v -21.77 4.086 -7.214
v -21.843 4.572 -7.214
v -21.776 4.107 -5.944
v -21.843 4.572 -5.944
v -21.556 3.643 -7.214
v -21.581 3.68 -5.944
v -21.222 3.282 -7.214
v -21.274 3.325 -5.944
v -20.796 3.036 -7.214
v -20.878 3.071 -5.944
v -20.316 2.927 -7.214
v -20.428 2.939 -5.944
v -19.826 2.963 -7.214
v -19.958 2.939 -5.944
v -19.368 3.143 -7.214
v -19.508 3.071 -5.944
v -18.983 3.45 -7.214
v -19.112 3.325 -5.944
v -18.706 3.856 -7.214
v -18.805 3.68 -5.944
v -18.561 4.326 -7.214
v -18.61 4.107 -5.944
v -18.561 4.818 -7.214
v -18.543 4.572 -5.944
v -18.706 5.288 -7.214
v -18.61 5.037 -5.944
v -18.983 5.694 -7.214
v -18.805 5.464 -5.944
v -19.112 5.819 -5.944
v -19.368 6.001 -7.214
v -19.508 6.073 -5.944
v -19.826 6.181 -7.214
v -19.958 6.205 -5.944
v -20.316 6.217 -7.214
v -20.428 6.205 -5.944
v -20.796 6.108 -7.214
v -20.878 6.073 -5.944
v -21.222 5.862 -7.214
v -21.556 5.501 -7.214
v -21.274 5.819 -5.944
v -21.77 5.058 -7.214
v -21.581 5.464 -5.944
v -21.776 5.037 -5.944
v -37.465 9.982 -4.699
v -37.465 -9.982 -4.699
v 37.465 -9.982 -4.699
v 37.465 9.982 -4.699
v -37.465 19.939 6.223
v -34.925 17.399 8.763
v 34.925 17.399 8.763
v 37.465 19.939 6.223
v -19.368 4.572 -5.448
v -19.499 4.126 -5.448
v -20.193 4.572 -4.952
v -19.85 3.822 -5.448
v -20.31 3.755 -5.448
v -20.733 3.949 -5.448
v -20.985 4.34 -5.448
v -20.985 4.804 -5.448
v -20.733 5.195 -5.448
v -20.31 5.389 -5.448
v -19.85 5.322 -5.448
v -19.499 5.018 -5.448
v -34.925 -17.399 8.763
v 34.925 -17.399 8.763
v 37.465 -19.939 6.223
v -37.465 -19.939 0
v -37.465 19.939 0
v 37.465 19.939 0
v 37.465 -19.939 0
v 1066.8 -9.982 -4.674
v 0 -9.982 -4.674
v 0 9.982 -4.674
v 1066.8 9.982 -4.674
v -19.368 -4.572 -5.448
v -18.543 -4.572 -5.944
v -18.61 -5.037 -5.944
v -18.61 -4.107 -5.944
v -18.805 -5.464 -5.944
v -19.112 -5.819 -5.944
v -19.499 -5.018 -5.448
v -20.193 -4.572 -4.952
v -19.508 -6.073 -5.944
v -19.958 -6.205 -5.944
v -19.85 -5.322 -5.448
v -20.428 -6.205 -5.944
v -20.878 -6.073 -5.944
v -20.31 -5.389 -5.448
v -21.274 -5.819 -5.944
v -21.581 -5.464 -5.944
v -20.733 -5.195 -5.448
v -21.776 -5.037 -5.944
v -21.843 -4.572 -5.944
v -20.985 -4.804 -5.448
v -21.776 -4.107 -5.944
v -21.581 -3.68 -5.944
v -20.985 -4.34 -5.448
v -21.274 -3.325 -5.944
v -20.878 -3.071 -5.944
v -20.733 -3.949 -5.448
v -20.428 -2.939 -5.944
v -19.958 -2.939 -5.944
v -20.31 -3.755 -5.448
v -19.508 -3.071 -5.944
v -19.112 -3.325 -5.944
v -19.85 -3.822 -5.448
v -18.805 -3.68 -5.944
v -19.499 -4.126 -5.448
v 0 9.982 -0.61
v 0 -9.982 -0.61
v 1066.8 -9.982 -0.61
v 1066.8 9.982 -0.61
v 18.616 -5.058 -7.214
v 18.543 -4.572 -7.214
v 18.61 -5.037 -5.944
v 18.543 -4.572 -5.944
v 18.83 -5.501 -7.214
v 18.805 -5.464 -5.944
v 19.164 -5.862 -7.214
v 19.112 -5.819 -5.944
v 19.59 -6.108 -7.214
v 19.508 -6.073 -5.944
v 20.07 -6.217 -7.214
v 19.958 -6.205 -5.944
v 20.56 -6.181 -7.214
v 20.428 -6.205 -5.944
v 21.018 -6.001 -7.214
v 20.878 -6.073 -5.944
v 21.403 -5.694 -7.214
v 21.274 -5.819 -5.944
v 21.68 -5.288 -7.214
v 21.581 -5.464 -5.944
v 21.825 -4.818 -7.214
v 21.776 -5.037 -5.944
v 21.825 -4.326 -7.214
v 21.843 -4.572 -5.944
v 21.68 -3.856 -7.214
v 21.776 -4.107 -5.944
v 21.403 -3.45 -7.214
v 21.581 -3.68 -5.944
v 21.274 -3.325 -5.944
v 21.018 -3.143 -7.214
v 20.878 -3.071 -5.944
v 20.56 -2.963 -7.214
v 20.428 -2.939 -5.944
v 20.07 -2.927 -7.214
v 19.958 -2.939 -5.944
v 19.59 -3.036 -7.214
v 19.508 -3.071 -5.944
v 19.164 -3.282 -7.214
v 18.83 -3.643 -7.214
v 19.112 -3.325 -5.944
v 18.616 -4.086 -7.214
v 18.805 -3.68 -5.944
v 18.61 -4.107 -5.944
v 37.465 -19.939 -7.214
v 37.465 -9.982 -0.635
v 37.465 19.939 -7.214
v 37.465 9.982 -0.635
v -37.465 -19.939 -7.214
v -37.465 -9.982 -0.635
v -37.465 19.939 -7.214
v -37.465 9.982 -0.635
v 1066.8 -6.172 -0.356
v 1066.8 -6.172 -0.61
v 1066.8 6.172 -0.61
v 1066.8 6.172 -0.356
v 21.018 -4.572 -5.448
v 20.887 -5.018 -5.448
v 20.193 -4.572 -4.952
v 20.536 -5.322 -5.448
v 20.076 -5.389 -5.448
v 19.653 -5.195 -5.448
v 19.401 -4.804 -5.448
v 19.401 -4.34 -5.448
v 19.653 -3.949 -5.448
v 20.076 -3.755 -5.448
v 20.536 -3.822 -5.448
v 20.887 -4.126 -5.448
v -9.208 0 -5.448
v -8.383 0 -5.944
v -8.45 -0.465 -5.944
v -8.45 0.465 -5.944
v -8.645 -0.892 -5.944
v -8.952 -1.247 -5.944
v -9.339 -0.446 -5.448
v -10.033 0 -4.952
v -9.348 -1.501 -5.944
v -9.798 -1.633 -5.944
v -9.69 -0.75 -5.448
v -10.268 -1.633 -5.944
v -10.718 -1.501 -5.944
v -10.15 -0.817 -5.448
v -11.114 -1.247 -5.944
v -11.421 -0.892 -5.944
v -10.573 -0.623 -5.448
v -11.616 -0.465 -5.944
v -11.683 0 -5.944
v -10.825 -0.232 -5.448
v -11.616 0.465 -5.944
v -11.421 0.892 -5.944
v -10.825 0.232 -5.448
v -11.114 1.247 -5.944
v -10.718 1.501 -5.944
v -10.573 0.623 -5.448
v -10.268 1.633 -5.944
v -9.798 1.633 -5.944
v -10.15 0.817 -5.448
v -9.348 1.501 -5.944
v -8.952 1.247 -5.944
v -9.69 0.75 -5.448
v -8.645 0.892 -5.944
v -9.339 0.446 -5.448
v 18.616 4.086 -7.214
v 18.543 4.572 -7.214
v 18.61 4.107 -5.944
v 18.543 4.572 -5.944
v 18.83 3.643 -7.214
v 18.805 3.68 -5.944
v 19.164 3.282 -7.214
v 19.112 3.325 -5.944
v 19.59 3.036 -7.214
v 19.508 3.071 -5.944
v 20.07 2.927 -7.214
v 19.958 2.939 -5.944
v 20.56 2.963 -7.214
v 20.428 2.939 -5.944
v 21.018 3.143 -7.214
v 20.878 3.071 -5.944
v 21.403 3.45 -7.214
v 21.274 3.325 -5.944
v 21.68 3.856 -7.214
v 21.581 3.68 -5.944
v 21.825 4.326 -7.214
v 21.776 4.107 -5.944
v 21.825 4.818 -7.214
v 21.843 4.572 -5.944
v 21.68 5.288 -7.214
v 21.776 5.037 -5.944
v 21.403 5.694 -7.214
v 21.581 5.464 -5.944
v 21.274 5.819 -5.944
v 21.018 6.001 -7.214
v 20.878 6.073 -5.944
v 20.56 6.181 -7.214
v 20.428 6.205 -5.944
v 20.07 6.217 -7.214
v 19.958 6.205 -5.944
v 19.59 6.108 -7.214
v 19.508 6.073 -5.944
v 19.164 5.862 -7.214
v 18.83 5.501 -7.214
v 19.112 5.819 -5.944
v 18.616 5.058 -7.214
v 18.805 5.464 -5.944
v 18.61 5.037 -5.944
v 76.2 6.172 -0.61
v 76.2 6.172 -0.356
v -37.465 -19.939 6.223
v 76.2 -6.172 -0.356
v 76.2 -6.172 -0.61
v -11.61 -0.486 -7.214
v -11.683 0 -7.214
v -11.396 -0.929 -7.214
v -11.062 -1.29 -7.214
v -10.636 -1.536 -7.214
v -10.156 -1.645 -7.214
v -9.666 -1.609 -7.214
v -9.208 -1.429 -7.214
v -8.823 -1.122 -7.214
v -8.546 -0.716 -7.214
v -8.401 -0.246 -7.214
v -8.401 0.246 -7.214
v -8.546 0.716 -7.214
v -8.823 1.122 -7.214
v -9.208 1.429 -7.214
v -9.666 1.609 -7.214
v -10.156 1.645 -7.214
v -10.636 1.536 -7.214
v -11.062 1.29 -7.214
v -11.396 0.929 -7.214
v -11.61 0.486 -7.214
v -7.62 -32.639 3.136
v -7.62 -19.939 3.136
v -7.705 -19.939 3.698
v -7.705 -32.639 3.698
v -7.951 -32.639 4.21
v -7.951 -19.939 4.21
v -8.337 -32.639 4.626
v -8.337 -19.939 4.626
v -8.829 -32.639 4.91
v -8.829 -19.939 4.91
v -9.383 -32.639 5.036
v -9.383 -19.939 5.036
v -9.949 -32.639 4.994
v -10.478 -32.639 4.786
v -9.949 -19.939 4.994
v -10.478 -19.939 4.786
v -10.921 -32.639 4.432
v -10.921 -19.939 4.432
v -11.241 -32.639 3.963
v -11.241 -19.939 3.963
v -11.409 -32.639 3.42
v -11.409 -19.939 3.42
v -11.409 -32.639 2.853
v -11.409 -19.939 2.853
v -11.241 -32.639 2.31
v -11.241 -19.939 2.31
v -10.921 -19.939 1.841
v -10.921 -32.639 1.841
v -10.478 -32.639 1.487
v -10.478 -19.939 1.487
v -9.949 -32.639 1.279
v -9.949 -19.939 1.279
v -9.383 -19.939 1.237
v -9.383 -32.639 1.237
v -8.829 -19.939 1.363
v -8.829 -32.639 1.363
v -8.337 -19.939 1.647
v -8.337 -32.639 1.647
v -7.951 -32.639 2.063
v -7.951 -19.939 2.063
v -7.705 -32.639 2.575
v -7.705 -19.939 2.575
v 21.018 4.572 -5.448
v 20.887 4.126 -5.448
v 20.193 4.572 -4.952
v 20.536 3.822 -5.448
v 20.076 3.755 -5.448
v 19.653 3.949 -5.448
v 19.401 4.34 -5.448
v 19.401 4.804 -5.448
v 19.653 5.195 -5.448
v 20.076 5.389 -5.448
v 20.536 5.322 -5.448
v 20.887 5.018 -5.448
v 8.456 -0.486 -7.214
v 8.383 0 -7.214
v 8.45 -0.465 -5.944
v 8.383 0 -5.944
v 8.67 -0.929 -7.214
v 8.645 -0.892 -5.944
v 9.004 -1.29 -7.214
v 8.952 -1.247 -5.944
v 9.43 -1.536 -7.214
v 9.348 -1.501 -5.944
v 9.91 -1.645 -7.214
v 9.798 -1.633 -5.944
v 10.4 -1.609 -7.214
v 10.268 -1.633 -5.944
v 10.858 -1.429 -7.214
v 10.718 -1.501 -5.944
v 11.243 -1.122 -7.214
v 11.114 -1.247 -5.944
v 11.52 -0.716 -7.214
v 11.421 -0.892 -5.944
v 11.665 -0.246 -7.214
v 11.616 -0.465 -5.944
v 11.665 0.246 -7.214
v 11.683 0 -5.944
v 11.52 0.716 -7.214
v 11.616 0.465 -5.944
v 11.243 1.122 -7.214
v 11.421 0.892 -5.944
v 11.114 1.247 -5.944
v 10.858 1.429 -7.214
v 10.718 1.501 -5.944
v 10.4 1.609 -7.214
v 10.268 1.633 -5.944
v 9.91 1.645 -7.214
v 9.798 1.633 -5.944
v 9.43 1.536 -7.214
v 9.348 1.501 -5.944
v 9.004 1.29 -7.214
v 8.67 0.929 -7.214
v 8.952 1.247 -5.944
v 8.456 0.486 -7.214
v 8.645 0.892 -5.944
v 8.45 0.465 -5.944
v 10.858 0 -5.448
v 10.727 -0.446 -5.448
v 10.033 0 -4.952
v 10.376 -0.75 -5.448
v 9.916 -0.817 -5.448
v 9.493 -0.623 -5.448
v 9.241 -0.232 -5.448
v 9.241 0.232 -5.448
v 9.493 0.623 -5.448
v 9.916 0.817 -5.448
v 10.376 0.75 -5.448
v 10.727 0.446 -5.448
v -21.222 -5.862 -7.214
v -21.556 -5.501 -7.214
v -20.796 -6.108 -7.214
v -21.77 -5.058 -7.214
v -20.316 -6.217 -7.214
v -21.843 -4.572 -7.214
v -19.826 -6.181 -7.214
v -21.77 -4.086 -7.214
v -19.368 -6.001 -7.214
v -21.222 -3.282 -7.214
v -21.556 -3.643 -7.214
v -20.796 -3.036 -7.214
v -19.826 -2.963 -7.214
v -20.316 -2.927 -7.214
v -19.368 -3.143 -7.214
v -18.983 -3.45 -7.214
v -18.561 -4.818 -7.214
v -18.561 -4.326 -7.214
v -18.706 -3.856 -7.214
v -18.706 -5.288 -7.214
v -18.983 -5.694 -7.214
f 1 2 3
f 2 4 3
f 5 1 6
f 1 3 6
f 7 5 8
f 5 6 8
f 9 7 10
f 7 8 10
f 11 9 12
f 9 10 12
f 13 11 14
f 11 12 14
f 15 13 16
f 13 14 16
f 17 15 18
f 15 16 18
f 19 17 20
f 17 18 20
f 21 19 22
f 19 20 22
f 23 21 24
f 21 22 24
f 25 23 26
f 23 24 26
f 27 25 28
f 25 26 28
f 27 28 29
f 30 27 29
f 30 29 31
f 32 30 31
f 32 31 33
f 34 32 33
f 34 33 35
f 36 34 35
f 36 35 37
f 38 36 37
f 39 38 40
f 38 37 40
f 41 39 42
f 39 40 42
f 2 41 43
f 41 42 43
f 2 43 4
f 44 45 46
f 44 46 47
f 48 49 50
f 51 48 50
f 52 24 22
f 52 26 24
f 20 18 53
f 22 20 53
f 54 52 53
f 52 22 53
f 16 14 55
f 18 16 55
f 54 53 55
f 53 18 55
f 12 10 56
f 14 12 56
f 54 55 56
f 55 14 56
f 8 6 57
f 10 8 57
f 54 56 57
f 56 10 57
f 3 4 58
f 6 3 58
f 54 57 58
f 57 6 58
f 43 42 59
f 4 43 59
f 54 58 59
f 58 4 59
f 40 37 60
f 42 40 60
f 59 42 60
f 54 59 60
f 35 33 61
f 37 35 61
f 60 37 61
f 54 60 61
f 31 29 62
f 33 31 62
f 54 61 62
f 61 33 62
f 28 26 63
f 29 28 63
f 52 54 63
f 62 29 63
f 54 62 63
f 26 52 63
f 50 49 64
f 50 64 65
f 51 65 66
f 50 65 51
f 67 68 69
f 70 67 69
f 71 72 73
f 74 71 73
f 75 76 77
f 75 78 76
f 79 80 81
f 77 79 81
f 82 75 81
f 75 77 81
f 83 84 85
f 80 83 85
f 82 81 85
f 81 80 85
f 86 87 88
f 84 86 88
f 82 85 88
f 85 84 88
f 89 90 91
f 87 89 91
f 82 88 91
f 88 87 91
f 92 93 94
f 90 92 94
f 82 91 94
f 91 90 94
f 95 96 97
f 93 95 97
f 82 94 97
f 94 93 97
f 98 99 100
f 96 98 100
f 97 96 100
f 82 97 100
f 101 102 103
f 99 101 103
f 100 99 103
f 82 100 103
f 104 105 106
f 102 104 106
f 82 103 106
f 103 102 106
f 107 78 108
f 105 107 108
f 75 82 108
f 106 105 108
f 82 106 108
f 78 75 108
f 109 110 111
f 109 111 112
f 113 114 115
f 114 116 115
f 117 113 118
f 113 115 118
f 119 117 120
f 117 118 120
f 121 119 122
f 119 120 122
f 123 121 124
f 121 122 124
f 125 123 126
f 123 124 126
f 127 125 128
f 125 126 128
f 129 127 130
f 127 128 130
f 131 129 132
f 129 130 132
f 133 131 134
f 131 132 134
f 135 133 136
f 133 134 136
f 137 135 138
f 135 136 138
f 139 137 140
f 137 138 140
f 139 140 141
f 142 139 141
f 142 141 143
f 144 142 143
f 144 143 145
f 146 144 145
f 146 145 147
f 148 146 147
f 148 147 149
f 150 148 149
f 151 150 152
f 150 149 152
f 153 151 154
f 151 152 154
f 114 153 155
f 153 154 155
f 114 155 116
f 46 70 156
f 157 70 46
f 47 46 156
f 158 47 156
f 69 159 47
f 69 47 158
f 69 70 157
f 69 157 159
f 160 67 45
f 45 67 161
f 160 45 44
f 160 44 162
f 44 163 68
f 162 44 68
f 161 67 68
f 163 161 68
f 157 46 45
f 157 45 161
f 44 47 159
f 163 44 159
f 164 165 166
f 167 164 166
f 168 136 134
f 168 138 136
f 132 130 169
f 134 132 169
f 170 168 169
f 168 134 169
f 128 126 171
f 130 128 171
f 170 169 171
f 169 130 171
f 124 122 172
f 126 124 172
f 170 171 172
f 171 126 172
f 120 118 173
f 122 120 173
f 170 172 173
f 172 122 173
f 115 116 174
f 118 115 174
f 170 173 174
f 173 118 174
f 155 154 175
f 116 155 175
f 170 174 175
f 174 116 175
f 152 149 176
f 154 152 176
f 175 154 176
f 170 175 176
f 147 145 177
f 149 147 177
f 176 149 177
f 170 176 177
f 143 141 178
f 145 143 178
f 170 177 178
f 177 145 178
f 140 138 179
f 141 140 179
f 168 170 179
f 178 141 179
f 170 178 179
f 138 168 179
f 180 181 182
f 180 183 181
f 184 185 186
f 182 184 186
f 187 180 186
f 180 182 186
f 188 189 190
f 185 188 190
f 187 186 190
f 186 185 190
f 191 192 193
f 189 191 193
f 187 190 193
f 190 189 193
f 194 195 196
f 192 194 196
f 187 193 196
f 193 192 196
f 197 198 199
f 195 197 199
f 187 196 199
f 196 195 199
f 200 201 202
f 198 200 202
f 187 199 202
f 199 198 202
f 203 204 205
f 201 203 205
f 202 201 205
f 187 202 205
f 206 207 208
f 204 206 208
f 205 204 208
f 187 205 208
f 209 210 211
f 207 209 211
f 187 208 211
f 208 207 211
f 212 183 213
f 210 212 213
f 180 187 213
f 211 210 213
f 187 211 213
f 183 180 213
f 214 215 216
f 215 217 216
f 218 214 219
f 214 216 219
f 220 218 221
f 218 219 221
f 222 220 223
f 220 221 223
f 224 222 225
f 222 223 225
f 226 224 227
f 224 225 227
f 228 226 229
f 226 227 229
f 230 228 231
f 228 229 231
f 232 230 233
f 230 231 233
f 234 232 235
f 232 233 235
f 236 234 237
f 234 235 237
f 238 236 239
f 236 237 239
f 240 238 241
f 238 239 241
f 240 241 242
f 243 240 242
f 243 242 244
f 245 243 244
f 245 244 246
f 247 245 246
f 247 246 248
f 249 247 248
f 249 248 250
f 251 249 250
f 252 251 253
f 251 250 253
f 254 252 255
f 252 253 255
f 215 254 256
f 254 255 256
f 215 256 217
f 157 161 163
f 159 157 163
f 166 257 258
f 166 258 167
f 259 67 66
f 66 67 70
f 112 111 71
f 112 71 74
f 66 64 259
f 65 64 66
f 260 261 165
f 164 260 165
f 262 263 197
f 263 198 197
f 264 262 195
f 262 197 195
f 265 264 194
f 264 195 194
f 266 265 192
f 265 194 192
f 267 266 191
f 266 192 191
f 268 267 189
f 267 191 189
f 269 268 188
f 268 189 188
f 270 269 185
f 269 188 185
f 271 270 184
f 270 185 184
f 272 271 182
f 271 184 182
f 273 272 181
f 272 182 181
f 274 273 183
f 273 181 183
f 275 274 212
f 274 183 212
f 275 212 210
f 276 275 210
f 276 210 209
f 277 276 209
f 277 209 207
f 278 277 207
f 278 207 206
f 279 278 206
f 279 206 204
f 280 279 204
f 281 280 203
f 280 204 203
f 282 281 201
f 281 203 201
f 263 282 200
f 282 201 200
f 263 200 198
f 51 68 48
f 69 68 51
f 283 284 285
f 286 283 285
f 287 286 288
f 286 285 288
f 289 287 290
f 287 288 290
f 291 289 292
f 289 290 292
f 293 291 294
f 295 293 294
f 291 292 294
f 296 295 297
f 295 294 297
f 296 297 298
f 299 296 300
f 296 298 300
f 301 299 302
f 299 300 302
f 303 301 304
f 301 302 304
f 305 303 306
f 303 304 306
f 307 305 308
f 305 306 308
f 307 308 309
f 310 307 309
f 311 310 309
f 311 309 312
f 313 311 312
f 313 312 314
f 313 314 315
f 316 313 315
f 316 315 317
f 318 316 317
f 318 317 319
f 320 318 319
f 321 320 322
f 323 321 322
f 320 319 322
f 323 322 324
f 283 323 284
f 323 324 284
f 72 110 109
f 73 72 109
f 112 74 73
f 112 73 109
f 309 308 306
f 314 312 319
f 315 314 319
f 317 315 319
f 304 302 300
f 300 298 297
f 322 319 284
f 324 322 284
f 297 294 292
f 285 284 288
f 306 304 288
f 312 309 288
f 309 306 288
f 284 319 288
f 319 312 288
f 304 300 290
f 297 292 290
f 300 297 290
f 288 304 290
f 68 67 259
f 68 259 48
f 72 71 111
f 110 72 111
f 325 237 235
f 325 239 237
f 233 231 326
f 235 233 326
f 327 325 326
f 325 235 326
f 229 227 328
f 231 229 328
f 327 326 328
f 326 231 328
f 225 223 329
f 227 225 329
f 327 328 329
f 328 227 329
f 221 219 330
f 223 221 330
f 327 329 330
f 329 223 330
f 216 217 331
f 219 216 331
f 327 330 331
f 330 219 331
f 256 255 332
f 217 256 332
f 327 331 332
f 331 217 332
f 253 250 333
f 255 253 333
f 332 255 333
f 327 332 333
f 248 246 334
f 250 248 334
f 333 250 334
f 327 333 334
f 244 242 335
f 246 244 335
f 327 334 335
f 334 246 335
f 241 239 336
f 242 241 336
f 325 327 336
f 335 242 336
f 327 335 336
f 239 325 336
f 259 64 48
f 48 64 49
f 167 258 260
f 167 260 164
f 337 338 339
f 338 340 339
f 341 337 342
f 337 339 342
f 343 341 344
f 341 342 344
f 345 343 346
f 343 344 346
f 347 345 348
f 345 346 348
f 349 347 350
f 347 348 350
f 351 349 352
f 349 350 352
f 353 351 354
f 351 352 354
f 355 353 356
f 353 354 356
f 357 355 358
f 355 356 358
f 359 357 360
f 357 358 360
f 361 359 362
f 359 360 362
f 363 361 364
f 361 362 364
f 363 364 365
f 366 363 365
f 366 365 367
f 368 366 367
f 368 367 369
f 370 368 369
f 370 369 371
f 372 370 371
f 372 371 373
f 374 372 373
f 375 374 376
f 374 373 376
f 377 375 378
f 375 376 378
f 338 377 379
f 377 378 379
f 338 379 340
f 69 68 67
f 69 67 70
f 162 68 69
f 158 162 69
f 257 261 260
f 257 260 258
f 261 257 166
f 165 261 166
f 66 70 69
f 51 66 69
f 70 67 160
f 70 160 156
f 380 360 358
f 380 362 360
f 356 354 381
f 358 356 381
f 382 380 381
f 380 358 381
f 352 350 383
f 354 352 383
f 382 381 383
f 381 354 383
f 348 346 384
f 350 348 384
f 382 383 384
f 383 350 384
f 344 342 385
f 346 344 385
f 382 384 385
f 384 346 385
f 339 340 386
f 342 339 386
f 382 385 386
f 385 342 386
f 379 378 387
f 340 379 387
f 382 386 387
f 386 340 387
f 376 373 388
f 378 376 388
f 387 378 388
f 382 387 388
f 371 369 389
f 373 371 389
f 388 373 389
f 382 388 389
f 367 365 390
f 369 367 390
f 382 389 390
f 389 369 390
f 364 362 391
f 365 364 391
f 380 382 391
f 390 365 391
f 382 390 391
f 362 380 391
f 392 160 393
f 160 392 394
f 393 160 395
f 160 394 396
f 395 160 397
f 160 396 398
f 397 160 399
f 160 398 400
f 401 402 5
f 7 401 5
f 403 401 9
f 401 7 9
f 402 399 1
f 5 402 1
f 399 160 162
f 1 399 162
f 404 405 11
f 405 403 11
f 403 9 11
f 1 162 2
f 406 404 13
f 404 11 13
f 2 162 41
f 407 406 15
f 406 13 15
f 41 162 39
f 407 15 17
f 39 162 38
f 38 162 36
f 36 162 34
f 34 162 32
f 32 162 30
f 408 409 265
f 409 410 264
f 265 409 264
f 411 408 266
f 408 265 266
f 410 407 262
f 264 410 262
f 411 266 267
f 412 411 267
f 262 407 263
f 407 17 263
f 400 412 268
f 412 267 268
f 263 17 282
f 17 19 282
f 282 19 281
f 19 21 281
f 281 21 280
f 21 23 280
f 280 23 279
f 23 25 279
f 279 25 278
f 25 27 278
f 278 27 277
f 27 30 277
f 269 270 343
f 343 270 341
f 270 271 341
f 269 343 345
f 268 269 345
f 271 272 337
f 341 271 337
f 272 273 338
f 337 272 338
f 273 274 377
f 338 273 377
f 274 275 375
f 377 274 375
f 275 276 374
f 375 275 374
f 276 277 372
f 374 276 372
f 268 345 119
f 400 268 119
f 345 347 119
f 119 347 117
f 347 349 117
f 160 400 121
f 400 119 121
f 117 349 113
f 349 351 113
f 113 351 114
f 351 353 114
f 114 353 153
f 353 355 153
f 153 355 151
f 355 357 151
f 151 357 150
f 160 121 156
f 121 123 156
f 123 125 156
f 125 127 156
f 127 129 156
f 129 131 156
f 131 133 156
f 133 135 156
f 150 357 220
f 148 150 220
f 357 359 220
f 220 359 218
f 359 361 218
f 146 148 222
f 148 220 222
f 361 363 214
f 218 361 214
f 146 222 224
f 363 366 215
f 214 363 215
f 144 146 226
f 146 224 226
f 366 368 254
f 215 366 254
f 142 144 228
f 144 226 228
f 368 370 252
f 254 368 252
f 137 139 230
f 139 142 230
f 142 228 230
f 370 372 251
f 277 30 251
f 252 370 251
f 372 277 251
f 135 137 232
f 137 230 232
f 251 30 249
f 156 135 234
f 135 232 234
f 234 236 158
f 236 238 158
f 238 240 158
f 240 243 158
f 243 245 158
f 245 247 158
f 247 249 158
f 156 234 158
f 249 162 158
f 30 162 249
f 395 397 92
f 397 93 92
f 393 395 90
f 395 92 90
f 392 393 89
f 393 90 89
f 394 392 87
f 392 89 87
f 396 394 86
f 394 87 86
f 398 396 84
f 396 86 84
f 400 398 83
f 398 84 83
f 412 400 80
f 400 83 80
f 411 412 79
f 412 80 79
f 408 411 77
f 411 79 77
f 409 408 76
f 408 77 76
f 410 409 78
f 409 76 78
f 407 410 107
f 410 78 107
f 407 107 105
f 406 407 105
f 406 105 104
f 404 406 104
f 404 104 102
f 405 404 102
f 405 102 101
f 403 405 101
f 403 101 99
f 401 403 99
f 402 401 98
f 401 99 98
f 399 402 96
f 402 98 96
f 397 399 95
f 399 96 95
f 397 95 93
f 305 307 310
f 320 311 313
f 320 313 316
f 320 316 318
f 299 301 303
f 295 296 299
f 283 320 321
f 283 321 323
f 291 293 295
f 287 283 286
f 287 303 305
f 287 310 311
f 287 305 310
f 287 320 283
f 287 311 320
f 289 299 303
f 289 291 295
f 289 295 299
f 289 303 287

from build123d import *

# Parameters (mm, degrees)
F0_W      = 74.93
F0_H      = 39.878
F1_DEPTH  = 7.2136
F2_W      = 74.93
F2_H      = 39.878
F3_DEPTH  = 8.763
F4_SIZE   = 2.54
F5_R      = 1.905
F6_DEPTH  = 12.7
F7_W      = 19.9644
F7_H      = 4.064
F8_DEPTH  = 74.931
F10_W     = 19.9644
F10_H     = 4.064
F11_DEPTH = 1066.8
F12_W     = 990.6
F12_H     = 12.3444
F13_DEPTH = 0.254
F14_D     = 3.3
F14_DEPTH = 1.27
F14_TIP   = 0.9914200214


with BuildPart() as f1:
    # F0 (on Top) → F1 (new body)
    with BuildSketch(Plane.XY):
        Rectangle(F0_W, F0_H)
    extrude(amount=-F1_DEPTH)

    # F7 (on face) → F8 (cut, through all)
    with BuildSketch(Plane.YZ.offset(37.465)):
        with Locations((0, -2.667)):
            Rectangle(F7_W, F7_H)
    extrude(amount=-F8_DEPTH, mode=Mode.SUBTRACT)

    # F14
    with Locations(Plane(origin=(0, 0, -7.2136), x_dir=(1, 0, 0), z_dir=(0, 0, -1))):
        with Locations((20.193, 4.572), (20.193, -4.572), (10.033, 0), (-10.033, 0), (-20.193, 4.572), (-20.193, -4.572)):
            Hole(F14_D / 2, depth=F14_DEPTH)
            with Locations((0, 0, -(F14_DEPTH + F14_TIP / 2))):  # 118° drill point
                Cone(0, F14_D / 2, F14_TIP, mode=Mode.SUBTRACT)


with BuildPart() as f3:
    # F2 (on face) → F3 (new body)
    with BuildSketch(Plane.XY):
        Rectangle(F2_W, F2_H)
    extrude(amount=F3_DEPTH)

    # F4
    f4_edges = [f3.edges().sort_by_distance(p)[0] for p in [
        (37.465, 0, 8.763),
        (0, 19.939, 8.763),
        (-37.465, 0, 8.763),
        (0, -19.939, 8.763),
    ]]
    chamfer(f4_edges, length=F4_SIZE)


with BuildPart() as f6:
    # F5 (on face) → F6 (new body)
    with BuildSketch(Plane.XZ.offset(19.939)):
        with Locations((-9.525, 3.1364320312)):
            Circle(F5_R)
    extrude(amount=F6_DEPTH)


with BuildPart() as f11:
    # F10 (on Right) → F11 (new body)
    with BuildSketch(Plane.YZ):
        with Locations((0, -2.6416)):
            Rectangle(F10_W, F10_H)
    extrude(amount=F11_DEPTH)


with BuildPart() as f13:
    # F12 (on face) → F13 (new body)
    with BuildSketch(Plane.XY.offset(-0.6096)):
        with Locations((571.5, 0)):
            Rectangle(F12_W, F12_H)
    extrude(amount=F13_DEPTH)


solid = Compound([f1.part, f3.part, f6.part, f11.part, f13.part])
